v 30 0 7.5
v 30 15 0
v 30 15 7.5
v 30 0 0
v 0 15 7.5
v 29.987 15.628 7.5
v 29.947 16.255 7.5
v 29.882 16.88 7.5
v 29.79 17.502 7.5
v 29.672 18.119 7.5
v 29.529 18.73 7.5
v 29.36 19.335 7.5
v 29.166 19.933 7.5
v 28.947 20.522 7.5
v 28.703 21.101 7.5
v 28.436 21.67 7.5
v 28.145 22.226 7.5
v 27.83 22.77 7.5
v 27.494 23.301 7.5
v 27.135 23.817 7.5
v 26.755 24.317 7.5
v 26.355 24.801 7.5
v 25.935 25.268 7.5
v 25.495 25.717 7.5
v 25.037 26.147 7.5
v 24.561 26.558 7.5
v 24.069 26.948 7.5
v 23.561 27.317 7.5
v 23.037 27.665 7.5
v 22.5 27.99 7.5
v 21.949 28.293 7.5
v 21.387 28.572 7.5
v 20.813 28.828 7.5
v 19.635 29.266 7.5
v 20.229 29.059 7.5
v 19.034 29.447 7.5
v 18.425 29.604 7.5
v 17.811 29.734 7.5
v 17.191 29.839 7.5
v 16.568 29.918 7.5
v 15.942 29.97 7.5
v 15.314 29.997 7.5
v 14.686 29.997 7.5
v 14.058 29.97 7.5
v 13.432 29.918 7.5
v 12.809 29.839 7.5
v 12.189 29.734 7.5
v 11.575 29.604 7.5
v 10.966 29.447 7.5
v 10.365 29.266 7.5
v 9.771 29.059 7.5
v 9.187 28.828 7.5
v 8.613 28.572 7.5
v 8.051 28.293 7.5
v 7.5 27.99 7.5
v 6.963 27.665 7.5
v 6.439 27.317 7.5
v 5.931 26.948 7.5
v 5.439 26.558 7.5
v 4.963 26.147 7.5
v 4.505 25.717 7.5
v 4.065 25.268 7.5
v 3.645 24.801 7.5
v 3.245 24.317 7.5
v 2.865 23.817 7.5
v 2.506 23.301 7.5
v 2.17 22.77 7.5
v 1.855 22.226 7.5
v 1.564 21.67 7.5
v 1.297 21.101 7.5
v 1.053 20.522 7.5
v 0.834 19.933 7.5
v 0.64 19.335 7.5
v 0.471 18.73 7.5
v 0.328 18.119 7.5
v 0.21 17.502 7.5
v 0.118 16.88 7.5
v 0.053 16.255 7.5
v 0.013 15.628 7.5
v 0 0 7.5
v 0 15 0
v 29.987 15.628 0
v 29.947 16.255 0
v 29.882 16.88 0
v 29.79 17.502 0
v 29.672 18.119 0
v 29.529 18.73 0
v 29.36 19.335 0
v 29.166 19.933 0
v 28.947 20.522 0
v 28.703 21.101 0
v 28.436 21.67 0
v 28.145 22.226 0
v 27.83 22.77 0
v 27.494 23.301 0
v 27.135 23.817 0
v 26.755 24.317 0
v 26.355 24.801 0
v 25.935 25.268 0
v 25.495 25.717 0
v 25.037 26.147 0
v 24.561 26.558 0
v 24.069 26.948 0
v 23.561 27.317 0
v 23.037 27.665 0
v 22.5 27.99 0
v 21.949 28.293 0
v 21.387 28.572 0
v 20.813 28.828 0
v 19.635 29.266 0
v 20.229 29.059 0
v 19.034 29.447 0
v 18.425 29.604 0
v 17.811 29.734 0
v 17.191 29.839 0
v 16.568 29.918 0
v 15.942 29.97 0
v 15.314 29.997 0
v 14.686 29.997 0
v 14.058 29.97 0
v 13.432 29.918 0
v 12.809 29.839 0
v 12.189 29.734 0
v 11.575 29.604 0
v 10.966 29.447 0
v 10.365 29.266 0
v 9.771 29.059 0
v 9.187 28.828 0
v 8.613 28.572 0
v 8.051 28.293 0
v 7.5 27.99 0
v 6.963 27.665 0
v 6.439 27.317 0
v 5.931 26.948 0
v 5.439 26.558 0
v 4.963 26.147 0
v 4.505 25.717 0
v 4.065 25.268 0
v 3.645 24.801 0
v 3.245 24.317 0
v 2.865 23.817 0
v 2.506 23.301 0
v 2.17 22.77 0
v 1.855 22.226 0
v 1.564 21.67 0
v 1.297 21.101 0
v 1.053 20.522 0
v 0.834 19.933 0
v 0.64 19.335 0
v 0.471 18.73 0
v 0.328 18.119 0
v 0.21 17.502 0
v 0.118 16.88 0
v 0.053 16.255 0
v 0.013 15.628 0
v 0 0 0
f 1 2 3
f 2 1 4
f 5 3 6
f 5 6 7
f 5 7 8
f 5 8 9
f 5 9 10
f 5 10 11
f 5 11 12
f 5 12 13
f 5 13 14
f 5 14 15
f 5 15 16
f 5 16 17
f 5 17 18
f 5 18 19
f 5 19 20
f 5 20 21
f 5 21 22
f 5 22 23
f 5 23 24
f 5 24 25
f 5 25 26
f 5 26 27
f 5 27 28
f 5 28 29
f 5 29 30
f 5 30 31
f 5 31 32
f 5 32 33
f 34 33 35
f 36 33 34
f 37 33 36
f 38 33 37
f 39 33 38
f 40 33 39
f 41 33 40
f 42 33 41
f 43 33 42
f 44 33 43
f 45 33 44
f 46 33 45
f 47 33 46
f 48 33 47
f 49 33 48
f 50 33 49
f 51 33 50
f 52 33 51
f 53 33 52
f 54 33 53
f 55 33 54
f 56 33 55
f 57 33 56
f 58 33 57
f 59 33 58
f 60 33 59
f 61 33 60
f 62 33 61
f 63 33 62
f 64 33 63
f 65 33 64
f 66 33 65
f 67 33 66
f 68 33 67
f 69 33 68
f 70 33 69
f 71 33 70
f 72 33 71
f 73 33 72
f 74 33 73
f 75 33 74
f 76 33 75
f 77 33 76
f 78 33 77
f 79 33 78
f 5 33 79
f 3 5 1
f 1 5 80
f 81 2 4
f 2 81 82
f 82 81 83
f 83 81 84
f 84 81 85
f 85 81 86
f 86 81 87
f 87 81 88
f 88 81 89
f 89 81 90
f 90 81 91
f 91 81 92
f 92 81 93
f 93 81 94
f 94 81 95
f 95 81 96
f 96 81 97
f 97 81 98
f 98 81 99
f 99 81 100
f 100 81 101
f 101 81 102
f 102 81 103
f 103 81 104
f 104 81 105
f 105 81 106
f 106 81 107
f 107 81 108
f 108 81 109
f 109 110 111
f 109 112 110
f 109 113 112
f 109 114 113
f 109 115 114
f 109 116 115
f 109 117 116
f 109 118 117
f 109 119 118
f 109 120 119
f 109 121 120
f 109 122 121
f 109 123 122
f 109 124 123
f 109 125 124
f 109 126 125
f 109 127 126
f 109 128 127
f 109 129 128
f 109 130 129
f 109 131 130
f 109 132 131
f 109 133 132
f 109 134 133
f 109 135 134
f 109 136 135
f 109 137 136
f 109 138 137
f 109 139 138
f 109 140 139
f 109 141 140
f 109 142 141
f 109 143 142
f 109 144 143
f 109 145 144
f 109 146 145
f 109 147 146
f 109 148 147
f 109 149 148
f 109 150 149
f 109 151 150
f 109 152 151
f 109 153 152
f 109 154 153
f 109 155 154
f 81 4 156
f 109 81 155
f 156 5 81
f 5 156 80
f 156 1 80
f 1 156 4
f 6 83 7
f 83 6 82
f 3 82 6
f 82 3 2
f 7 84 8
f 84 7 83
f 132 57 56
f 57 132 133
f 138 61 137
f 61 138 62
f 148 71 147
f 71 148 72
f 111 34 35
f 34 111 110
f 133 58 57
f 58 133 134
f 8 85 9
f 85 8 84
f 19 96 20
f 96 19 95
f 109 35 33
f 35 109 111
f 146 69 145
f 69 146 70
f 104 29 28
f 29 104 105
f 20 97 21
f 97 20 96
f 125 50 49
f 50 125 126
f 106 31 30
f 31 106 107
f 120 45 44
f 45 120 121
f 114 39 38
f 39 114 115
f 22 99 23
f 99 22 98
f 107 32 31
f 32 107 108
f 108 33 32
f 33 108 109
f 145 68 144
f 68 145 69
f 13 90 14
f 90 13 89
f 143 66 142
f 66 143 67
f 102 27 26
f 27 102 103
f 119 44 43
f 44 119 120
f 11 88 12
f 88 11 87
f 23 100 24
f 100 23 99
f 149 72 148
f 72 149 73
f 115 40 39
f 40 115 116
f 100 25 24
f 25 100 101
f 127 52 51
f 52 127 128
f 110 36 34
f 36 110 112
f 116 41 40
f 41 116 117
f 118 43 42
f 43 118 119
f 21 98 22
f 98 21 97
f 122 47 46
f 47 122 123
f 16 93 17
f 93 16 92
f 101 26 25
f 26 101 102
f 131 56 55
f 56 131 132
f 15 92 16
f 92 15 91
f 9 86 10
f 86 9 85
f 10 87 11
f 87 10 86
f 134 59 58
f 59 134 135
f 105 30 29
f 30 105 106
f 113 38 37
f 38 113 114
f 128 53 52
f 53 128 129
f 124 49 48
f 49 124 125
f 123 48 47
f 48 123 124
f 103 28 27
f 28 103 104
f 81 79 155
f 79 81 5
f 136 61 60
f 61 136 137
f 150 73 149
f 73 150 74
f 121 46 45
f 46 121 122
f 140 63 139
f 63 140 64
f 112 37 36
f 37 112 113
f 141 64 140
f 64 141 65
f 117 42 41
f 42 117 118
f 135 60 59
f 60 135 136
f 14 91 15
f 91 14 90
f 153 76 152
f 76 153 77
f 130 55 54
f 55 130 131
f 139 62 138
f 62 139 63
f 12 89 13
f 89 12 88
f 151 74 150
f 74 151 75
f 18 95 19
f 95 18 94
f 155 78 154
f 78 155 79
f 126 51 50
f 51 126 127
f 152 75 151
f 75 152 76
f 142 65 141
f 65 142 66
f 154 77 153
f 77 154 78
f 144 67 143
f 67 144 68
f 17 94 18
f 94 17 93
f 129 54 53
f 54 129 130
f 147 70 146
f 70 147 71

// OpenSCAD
$fn = 150;

union() {
	cube(size = [30.0, 15.0, 7.5]);
	translate(v = [0, 15.0, 0]) {
		translate(v = [15.0, 0, 0]) {
			cylinder(d = 30.0, h = 7.5);
		}
	}
}
